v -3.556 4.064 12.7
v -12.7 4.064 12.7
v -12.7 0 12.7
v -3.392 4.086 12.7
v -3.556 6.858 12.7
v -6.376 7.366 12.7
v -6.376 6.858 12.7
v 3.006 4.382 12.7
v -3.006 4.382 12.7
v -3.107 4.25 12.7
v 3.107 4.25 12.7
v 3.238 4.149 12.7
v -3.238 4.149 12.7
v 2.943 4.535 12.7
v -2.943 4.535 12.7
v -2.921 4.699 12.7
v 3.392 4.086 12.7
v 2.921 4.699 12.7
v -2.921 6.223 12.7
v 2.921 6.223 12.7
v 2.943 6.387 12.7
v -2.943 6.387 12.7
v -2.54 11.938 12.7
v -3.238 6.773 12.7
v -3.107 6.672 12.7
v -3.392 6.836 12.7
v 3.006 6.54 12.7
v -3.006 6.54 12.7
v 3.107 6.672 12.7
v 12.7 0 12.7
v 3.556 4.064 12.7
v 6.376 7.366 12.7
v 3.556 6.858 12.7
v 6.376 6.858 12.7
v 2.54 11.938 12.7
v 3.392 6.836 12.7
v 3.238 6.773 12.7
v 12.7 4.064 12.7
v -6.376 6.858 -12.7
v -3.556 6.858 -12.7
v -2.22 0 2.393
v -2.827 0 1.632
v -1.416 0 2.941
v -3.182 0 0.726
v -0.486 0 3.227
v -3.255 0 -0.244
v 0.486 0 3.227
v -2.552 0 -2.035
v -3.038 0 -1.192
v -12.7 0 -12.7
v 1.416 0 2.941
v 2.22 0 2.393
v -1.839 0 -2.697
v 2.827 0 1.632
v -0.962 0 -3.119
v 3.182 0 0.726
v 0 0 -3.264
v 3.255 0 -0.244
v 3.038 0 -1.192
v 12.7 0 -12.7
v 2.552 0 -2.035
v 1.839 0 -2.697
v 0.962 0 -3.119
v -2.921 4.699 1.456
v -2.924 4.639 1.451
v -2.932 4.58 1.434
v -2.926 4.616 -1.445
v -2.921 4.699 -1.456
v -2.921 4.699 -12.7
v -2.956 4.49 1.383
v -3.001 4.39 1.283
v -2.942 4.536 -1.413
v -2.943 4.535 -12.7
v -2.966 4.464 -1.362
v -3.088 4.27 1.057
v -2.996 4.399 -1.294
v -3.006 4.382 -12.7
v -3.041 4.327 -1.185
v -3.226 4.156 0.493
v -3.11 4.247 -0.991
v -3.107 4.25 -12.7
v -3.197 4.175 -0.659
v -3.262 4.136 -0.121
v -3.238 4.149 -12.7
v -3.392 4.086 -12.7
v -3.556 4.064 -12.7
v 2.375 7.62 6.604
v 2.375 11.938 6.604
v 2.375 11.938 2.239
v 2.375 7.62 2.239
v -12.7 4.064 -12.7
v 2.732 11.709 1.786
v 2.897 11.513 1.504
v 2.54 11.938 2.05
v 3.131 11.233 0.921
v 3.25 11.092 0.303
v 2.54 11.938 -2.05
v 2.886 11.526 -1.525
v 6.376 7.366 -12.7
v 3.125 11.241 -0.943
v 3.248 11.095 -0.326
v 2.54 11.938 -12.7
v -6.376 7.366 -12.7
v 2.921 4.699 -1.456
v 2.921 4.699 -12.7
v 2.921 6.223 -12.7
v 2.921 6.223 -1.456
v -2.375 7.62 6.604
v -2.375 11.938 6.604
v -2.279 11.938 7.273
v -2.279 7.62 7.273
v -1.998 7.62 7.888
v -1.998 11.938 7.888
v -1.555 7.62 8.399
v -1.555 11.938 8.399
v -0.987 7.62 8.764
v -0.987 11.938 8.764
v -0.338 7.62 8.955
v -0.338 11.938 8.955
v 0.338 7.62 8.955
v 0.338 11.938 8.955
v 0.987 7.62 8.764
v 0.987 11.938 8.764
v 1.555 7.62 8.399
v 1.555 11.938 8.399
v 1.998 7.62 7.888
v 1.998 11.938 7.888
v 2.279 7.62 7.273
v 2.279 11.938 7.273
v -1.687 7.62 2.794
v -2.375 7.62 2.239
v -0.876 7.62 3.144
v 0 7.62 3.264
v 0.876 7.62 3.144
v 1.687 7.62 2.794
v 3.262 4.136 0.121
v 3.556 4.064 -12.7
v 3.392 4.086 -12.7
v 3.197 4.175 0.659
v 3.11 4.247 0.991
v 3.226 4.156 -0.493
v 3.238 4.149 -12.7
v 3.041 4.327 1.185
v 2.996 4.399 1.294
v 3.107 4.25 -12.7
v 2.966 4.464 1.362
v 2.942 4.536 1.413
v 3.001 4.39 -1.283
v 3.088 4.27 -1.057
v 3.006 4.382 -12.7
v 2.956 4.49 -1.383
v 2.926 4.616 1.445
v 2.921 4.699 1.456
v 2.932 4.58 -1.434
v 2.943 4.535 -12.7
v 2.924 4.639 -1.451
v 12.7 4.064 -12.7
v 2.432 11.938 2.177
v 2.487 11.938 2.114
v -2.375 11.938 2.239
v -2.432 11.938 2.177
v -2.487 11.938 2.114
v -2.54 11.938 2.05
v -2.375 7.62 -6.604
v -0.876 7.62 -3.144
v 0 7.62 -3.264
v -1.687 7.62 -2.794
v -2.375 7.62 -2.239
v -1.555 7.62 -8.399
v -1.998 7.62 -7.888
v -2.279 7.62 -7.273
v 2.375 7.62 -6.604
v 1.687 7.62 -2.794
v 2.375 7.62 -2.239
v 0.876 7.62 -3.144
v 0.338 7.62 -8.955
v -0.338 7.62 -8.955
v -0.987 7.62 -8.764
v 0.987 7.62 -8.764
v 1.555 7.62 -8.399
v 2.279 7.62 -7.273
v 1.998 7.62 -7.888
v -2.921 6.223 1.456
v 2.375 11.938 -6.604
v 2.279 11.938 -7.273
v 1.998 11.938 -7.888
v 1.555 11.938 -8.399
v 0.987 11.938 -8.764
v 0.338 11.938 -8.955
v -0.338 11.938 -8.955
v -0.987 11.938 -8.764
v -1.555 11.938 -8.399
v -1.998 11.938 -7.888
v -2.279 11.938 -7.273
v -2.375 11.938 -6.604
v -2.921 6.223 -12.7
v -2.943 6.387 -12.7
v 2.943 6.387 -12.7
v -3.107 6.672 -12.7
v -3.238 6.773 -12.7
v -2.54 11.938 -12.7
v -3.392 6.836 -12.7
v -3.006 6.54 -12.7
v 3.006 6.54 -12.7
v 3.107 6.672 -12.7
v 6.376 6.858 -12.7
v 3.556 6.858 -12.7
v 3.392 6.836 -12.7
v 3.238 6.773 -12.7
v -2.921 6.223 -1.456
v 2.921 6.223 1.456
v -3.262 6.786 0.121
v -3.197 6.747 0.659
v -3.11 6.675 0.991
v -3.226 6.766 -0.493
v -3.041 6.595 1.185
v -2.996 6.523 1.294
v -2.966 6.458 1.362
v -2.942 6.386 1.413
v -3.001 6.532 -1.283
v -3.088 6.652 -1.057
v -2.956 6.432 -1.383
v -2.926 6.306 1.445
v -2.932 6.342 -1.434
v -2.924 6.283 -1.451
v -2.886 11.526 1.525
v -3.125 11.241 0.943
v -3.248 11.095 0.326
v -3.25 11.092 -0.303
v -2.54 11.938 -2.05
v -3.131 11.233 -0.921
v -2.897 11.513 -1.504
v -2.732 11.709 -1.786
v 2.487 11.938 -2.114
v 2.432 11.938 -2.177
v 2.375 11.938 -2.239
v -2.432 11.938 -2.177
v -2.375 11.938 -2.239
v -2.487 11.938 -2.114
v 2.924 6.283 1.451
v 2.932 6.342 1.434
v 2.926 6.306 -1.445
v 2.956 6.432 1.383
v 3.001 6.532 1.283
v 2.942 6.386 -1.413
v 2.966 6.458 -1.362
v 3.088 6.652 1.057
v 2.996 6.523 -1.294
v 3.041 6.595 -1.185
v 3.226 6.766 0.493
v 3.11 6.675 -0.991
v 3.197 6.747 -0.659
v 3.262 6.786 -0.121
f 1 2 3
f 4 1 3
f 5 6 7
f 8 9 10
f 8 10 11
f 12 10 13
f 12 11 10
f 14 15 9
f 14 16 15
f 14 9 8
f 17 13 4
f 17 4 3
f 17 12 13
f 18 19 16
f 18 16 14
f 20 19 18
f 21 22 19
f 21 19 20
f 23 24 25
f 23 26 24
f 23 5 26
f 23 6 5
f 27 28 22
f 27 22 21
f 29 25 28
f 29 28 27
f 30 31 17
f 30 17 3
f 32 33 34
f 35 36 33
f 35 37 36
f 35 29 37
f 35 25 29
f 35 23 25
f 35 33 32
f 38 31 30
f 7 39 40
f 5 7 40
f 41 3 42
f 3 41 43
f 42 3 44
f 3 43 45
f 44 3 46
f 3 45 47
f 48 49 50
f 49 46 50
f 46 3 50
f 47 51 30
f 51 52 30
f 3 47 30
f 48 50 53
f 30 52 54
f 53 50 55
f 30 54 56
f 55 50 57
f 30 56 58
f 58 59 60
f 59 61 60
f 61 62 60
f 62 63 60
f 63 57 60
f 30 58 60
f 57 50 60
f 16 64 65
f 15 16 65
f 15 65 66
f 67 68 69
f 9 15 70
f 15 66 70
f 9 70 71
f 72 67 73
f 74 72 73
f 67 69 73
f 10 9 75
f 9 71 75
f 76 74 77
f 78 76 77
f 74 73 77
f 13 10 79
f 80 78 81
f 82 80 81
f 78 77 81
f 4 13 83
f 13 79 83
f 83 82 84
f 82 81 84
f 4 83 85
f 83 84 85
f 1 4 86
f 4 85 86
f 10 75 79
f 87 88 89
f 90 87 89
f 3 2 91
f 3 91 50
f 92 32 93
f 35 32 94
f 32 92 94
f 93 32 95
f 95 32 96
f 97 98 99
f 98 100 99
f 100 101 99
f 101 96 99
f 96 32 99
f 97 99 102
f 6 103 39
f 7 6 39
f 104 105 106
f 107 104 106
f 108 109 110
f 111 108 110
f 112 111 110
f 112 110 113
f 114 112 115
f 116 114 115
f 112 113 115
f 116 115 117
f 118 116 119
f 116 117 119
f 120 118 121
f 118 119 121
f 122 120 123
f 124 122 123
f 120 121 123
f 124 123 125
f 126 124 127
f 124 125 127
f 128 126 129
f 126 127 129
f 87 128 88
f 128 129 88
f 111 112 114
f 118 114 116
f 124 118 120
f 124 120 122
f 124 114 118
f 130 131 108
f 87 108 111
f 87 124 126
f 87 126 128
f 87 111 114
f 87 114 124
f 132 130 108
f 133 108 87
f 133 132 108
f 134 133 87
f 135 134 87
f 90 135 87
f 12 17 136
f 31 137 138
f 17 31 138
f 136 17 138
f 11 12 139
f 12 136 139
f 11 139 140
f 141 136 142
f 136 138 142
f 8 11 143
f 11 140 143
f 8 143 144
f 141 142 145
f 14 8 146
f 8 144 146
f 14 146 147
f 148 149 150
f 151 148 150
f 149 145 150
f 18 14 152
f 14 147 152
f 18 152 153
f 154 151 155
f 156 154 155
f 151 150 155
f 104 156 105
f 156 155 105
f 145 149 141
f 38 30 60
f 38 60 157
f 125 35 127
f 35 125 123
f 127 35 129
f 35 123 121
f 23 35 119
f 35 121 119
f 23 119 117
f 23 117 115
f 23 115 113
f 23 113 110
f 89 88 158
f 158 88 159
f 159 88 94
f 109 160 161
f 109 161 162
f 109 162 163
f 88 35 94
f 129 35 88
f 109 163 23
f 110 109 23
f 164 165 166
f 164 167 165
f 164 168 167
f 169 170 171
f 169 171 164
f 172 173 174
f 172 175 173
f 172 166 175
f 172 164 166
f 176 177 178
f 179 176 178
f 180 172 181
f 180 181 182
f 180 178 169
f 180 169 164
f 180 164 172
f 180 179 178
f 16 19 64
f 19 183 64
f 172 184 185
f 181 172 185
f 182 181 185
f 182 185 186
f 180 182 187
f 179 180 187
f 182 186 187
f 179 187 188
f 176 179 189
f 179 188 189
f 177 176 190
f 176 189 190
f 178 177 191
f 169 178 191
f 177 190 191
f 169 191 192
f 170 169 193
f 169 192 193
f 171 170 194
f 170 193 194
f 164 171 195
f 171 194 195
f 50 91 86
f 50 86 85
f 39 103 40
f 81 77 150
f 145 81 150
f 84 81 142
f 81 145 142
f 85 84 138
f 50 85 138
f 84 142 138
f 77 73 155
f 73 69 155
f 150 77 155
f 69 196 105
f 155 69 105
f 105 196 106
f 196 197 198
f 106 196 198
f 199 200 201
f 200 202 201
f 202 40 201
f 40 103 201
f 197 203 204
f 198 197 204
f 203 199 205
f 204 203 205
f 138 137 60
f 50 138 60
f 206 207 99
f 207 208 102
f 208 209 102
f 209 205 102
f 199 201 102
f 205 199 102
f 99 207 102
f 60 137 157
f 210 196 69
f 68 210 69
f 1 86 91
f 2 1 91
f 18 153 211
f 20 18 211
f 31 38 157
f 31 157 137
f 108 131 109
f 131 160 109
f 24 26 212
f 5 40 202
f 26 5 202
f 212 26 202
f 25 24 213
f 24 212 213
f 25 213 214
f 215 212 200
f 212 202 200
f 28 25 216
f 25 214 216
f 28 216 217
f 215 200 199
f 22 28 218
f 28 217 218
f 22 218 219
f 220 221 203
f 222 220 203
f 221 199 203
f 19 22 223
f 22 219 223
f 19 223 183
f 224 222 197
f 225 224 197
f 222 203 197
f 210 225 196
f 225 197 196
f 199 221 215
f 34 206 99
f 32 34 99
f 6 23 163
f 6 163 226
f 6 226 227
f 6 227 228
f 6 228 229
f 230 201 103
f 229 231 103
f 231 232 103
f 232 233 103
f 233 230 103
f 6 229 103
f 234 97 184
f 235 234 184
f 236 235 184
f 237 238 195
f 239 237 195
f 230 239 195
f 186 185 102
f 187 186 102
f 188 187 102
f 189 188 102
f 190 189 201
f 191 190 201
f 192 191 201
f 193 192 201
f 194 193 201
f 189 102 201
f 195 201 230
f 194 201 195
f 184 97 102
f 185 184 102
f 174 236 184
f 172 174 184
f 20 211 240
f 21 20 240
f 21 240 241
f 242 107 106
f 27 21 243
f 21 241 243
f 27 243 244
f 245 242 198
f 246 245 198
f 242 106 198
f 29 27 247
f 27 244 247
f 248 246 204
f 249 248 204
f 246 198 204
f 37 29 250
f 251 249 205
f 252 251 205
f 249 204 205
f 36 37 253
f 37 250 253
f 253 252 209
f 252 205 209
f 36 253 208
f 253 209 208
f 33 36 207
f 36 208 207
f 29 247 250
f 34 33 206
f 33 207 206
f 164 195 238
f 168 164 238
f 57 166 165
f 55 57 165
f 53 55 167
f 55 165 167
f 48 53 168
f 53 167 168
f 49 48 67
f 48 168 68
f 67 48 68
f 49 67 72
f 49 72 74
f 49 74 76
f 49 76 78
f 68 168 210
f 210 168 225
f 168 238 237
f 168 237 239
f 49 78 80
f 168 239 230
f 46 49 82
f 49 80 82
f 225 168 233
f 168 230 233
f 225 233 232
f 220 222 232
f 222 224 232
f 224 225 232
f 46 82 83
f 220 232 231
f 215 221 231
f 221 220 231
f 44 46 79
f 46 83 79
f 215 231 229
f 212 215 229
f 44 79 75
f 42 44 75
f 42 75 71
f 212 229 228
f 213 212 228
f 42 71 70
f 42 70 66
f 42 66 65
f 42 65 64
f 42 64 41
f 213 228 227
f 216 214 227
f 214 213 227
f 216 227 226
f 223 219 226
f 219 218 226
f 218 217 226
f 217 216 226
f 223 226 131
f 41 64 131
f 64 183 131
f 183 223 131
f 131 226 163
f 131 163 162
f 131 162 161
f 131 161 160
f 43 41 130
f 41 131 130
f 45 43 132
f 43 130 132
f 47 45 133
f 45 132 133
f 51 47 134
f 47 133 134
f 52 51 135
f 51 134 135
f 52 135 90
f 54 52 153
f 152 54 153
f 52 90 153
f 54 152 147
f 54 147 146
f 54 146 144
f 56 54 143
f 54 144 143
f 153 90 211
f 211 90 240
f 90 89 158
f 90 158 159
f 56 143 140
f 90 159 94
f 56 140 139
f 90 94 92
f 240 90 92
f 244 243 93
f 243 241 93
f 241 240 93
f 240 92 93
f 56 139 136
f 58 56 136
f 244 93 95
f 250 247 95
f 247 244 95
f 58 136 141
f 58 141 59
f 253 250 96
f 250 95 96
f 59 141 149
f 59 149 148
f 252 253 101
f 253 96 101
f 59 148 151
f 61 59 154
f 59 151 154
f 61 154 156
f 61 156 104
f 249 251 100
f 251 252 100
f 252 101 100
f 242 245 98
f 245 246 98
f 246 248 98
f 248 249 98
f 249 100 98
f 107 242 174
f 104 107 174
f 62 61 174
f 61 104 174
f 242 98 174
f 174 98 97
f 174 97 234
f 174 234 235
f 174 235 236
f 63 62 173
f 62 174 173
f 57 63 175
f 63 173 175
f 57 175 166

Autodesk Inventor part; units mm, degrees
sketch "Sketch_1" plane through (0, 0, 0) normal (0, 0, 1) x (1, 0, 0)
  line L0 (-12.7, 4.064) -> (-12.7, 0)
  line L1 (-12.7, 0) -> (12.7, 0)
  line L2 (12.7, 0) -> (12.7, 4.064)
  line L3 (12.7, 4.064) -> (3.556, 4.064)
  arc A0 (2.921, 4.699) -> (3.556, 4.064) centre (3.556, 4.699) ccw
  line L4 (2.921, 4.699) -> (2.921, 6.223)
  arc A1 (3.556, 6.858) -> (2.921, 6.223) centre (3.556, 6.223) ccw
  line L5 (3.556, 6.858) -> (6.3764, 6.858)
  line L6 (6.3764, 6.858) -> (6.3764, 7.366)
  line L7 (6.3764, 7.366) -> (2.54, 11.938)
  line L8 (2.54, 11.938) -> (-2.54, 11.938)
  line L9 (-2.54, 11.938) -> (-6.3764, 7.366)
  line L10 (-6.3764, 7.366) -> (-6.3764, 6.858)
  line L11 (-6.3764, 6.858) -> (-3.556, 6.858)
  arc A2 (-2.921, 6.223) -> (-3.556, 6.858) centre (-3.556, 6.223) ccw
  line L12 (-2.921, 6.223) -> (-2.921, 4.699)
  arc A3 (-3.556, 4.064) -> (-2.921, 4.699) centre (-3.556, 4.699) ccw
  line L13 (-3.556, 4.064) -> (-12.7, 4.064)
extrude "Extrusion1" add sketch "Sketch_1" along normal mid plane 25.4
sketch "Sketch_2" plane through (0, 11.938, 0) normal (0, 1, 0) x (1, 0, 0)
  line L0 (-2.3749, 6.604) -> (-2.3749, -6.604)
  arc A0 (-2.3749, -6.604) -> (2.3749, -6.604) centre (0, -6.604) ccw
  line L1 (2.3749, -6.604) -> (2.3749, 6.604)
  arc A1 (2.3749, 6.604) -> (-2.3749, 6.604) centre (0, 6.604) ccw
extrude "Extrusion2" cut sketch "Sketch_2" against normal blind 4.318
sketch "Sketch3" plane through (-12.7, 0, 12.7) normal (0, -1, 0) x (1, 0, 0)
  point P0 (12.7, -12.7)
hole "Hole1" at (0, 0, 0) direction (0, 1, 0) diameter 6.5278 depth 11.938
ref_plane "to_screw_XY" through (0, 0, 0) normal (0, -1, 0) x (1, 0, 0)
ref_plane "to_screw_YZ" through (0, 0, 0) normal (1, 0, 0) x (0, 0, 1)
ref_plane "to_screw_ZX" through (0, 0, 0) normal (0, 0, 1) x (0, -1, 0)
properties part number "2059_a"
